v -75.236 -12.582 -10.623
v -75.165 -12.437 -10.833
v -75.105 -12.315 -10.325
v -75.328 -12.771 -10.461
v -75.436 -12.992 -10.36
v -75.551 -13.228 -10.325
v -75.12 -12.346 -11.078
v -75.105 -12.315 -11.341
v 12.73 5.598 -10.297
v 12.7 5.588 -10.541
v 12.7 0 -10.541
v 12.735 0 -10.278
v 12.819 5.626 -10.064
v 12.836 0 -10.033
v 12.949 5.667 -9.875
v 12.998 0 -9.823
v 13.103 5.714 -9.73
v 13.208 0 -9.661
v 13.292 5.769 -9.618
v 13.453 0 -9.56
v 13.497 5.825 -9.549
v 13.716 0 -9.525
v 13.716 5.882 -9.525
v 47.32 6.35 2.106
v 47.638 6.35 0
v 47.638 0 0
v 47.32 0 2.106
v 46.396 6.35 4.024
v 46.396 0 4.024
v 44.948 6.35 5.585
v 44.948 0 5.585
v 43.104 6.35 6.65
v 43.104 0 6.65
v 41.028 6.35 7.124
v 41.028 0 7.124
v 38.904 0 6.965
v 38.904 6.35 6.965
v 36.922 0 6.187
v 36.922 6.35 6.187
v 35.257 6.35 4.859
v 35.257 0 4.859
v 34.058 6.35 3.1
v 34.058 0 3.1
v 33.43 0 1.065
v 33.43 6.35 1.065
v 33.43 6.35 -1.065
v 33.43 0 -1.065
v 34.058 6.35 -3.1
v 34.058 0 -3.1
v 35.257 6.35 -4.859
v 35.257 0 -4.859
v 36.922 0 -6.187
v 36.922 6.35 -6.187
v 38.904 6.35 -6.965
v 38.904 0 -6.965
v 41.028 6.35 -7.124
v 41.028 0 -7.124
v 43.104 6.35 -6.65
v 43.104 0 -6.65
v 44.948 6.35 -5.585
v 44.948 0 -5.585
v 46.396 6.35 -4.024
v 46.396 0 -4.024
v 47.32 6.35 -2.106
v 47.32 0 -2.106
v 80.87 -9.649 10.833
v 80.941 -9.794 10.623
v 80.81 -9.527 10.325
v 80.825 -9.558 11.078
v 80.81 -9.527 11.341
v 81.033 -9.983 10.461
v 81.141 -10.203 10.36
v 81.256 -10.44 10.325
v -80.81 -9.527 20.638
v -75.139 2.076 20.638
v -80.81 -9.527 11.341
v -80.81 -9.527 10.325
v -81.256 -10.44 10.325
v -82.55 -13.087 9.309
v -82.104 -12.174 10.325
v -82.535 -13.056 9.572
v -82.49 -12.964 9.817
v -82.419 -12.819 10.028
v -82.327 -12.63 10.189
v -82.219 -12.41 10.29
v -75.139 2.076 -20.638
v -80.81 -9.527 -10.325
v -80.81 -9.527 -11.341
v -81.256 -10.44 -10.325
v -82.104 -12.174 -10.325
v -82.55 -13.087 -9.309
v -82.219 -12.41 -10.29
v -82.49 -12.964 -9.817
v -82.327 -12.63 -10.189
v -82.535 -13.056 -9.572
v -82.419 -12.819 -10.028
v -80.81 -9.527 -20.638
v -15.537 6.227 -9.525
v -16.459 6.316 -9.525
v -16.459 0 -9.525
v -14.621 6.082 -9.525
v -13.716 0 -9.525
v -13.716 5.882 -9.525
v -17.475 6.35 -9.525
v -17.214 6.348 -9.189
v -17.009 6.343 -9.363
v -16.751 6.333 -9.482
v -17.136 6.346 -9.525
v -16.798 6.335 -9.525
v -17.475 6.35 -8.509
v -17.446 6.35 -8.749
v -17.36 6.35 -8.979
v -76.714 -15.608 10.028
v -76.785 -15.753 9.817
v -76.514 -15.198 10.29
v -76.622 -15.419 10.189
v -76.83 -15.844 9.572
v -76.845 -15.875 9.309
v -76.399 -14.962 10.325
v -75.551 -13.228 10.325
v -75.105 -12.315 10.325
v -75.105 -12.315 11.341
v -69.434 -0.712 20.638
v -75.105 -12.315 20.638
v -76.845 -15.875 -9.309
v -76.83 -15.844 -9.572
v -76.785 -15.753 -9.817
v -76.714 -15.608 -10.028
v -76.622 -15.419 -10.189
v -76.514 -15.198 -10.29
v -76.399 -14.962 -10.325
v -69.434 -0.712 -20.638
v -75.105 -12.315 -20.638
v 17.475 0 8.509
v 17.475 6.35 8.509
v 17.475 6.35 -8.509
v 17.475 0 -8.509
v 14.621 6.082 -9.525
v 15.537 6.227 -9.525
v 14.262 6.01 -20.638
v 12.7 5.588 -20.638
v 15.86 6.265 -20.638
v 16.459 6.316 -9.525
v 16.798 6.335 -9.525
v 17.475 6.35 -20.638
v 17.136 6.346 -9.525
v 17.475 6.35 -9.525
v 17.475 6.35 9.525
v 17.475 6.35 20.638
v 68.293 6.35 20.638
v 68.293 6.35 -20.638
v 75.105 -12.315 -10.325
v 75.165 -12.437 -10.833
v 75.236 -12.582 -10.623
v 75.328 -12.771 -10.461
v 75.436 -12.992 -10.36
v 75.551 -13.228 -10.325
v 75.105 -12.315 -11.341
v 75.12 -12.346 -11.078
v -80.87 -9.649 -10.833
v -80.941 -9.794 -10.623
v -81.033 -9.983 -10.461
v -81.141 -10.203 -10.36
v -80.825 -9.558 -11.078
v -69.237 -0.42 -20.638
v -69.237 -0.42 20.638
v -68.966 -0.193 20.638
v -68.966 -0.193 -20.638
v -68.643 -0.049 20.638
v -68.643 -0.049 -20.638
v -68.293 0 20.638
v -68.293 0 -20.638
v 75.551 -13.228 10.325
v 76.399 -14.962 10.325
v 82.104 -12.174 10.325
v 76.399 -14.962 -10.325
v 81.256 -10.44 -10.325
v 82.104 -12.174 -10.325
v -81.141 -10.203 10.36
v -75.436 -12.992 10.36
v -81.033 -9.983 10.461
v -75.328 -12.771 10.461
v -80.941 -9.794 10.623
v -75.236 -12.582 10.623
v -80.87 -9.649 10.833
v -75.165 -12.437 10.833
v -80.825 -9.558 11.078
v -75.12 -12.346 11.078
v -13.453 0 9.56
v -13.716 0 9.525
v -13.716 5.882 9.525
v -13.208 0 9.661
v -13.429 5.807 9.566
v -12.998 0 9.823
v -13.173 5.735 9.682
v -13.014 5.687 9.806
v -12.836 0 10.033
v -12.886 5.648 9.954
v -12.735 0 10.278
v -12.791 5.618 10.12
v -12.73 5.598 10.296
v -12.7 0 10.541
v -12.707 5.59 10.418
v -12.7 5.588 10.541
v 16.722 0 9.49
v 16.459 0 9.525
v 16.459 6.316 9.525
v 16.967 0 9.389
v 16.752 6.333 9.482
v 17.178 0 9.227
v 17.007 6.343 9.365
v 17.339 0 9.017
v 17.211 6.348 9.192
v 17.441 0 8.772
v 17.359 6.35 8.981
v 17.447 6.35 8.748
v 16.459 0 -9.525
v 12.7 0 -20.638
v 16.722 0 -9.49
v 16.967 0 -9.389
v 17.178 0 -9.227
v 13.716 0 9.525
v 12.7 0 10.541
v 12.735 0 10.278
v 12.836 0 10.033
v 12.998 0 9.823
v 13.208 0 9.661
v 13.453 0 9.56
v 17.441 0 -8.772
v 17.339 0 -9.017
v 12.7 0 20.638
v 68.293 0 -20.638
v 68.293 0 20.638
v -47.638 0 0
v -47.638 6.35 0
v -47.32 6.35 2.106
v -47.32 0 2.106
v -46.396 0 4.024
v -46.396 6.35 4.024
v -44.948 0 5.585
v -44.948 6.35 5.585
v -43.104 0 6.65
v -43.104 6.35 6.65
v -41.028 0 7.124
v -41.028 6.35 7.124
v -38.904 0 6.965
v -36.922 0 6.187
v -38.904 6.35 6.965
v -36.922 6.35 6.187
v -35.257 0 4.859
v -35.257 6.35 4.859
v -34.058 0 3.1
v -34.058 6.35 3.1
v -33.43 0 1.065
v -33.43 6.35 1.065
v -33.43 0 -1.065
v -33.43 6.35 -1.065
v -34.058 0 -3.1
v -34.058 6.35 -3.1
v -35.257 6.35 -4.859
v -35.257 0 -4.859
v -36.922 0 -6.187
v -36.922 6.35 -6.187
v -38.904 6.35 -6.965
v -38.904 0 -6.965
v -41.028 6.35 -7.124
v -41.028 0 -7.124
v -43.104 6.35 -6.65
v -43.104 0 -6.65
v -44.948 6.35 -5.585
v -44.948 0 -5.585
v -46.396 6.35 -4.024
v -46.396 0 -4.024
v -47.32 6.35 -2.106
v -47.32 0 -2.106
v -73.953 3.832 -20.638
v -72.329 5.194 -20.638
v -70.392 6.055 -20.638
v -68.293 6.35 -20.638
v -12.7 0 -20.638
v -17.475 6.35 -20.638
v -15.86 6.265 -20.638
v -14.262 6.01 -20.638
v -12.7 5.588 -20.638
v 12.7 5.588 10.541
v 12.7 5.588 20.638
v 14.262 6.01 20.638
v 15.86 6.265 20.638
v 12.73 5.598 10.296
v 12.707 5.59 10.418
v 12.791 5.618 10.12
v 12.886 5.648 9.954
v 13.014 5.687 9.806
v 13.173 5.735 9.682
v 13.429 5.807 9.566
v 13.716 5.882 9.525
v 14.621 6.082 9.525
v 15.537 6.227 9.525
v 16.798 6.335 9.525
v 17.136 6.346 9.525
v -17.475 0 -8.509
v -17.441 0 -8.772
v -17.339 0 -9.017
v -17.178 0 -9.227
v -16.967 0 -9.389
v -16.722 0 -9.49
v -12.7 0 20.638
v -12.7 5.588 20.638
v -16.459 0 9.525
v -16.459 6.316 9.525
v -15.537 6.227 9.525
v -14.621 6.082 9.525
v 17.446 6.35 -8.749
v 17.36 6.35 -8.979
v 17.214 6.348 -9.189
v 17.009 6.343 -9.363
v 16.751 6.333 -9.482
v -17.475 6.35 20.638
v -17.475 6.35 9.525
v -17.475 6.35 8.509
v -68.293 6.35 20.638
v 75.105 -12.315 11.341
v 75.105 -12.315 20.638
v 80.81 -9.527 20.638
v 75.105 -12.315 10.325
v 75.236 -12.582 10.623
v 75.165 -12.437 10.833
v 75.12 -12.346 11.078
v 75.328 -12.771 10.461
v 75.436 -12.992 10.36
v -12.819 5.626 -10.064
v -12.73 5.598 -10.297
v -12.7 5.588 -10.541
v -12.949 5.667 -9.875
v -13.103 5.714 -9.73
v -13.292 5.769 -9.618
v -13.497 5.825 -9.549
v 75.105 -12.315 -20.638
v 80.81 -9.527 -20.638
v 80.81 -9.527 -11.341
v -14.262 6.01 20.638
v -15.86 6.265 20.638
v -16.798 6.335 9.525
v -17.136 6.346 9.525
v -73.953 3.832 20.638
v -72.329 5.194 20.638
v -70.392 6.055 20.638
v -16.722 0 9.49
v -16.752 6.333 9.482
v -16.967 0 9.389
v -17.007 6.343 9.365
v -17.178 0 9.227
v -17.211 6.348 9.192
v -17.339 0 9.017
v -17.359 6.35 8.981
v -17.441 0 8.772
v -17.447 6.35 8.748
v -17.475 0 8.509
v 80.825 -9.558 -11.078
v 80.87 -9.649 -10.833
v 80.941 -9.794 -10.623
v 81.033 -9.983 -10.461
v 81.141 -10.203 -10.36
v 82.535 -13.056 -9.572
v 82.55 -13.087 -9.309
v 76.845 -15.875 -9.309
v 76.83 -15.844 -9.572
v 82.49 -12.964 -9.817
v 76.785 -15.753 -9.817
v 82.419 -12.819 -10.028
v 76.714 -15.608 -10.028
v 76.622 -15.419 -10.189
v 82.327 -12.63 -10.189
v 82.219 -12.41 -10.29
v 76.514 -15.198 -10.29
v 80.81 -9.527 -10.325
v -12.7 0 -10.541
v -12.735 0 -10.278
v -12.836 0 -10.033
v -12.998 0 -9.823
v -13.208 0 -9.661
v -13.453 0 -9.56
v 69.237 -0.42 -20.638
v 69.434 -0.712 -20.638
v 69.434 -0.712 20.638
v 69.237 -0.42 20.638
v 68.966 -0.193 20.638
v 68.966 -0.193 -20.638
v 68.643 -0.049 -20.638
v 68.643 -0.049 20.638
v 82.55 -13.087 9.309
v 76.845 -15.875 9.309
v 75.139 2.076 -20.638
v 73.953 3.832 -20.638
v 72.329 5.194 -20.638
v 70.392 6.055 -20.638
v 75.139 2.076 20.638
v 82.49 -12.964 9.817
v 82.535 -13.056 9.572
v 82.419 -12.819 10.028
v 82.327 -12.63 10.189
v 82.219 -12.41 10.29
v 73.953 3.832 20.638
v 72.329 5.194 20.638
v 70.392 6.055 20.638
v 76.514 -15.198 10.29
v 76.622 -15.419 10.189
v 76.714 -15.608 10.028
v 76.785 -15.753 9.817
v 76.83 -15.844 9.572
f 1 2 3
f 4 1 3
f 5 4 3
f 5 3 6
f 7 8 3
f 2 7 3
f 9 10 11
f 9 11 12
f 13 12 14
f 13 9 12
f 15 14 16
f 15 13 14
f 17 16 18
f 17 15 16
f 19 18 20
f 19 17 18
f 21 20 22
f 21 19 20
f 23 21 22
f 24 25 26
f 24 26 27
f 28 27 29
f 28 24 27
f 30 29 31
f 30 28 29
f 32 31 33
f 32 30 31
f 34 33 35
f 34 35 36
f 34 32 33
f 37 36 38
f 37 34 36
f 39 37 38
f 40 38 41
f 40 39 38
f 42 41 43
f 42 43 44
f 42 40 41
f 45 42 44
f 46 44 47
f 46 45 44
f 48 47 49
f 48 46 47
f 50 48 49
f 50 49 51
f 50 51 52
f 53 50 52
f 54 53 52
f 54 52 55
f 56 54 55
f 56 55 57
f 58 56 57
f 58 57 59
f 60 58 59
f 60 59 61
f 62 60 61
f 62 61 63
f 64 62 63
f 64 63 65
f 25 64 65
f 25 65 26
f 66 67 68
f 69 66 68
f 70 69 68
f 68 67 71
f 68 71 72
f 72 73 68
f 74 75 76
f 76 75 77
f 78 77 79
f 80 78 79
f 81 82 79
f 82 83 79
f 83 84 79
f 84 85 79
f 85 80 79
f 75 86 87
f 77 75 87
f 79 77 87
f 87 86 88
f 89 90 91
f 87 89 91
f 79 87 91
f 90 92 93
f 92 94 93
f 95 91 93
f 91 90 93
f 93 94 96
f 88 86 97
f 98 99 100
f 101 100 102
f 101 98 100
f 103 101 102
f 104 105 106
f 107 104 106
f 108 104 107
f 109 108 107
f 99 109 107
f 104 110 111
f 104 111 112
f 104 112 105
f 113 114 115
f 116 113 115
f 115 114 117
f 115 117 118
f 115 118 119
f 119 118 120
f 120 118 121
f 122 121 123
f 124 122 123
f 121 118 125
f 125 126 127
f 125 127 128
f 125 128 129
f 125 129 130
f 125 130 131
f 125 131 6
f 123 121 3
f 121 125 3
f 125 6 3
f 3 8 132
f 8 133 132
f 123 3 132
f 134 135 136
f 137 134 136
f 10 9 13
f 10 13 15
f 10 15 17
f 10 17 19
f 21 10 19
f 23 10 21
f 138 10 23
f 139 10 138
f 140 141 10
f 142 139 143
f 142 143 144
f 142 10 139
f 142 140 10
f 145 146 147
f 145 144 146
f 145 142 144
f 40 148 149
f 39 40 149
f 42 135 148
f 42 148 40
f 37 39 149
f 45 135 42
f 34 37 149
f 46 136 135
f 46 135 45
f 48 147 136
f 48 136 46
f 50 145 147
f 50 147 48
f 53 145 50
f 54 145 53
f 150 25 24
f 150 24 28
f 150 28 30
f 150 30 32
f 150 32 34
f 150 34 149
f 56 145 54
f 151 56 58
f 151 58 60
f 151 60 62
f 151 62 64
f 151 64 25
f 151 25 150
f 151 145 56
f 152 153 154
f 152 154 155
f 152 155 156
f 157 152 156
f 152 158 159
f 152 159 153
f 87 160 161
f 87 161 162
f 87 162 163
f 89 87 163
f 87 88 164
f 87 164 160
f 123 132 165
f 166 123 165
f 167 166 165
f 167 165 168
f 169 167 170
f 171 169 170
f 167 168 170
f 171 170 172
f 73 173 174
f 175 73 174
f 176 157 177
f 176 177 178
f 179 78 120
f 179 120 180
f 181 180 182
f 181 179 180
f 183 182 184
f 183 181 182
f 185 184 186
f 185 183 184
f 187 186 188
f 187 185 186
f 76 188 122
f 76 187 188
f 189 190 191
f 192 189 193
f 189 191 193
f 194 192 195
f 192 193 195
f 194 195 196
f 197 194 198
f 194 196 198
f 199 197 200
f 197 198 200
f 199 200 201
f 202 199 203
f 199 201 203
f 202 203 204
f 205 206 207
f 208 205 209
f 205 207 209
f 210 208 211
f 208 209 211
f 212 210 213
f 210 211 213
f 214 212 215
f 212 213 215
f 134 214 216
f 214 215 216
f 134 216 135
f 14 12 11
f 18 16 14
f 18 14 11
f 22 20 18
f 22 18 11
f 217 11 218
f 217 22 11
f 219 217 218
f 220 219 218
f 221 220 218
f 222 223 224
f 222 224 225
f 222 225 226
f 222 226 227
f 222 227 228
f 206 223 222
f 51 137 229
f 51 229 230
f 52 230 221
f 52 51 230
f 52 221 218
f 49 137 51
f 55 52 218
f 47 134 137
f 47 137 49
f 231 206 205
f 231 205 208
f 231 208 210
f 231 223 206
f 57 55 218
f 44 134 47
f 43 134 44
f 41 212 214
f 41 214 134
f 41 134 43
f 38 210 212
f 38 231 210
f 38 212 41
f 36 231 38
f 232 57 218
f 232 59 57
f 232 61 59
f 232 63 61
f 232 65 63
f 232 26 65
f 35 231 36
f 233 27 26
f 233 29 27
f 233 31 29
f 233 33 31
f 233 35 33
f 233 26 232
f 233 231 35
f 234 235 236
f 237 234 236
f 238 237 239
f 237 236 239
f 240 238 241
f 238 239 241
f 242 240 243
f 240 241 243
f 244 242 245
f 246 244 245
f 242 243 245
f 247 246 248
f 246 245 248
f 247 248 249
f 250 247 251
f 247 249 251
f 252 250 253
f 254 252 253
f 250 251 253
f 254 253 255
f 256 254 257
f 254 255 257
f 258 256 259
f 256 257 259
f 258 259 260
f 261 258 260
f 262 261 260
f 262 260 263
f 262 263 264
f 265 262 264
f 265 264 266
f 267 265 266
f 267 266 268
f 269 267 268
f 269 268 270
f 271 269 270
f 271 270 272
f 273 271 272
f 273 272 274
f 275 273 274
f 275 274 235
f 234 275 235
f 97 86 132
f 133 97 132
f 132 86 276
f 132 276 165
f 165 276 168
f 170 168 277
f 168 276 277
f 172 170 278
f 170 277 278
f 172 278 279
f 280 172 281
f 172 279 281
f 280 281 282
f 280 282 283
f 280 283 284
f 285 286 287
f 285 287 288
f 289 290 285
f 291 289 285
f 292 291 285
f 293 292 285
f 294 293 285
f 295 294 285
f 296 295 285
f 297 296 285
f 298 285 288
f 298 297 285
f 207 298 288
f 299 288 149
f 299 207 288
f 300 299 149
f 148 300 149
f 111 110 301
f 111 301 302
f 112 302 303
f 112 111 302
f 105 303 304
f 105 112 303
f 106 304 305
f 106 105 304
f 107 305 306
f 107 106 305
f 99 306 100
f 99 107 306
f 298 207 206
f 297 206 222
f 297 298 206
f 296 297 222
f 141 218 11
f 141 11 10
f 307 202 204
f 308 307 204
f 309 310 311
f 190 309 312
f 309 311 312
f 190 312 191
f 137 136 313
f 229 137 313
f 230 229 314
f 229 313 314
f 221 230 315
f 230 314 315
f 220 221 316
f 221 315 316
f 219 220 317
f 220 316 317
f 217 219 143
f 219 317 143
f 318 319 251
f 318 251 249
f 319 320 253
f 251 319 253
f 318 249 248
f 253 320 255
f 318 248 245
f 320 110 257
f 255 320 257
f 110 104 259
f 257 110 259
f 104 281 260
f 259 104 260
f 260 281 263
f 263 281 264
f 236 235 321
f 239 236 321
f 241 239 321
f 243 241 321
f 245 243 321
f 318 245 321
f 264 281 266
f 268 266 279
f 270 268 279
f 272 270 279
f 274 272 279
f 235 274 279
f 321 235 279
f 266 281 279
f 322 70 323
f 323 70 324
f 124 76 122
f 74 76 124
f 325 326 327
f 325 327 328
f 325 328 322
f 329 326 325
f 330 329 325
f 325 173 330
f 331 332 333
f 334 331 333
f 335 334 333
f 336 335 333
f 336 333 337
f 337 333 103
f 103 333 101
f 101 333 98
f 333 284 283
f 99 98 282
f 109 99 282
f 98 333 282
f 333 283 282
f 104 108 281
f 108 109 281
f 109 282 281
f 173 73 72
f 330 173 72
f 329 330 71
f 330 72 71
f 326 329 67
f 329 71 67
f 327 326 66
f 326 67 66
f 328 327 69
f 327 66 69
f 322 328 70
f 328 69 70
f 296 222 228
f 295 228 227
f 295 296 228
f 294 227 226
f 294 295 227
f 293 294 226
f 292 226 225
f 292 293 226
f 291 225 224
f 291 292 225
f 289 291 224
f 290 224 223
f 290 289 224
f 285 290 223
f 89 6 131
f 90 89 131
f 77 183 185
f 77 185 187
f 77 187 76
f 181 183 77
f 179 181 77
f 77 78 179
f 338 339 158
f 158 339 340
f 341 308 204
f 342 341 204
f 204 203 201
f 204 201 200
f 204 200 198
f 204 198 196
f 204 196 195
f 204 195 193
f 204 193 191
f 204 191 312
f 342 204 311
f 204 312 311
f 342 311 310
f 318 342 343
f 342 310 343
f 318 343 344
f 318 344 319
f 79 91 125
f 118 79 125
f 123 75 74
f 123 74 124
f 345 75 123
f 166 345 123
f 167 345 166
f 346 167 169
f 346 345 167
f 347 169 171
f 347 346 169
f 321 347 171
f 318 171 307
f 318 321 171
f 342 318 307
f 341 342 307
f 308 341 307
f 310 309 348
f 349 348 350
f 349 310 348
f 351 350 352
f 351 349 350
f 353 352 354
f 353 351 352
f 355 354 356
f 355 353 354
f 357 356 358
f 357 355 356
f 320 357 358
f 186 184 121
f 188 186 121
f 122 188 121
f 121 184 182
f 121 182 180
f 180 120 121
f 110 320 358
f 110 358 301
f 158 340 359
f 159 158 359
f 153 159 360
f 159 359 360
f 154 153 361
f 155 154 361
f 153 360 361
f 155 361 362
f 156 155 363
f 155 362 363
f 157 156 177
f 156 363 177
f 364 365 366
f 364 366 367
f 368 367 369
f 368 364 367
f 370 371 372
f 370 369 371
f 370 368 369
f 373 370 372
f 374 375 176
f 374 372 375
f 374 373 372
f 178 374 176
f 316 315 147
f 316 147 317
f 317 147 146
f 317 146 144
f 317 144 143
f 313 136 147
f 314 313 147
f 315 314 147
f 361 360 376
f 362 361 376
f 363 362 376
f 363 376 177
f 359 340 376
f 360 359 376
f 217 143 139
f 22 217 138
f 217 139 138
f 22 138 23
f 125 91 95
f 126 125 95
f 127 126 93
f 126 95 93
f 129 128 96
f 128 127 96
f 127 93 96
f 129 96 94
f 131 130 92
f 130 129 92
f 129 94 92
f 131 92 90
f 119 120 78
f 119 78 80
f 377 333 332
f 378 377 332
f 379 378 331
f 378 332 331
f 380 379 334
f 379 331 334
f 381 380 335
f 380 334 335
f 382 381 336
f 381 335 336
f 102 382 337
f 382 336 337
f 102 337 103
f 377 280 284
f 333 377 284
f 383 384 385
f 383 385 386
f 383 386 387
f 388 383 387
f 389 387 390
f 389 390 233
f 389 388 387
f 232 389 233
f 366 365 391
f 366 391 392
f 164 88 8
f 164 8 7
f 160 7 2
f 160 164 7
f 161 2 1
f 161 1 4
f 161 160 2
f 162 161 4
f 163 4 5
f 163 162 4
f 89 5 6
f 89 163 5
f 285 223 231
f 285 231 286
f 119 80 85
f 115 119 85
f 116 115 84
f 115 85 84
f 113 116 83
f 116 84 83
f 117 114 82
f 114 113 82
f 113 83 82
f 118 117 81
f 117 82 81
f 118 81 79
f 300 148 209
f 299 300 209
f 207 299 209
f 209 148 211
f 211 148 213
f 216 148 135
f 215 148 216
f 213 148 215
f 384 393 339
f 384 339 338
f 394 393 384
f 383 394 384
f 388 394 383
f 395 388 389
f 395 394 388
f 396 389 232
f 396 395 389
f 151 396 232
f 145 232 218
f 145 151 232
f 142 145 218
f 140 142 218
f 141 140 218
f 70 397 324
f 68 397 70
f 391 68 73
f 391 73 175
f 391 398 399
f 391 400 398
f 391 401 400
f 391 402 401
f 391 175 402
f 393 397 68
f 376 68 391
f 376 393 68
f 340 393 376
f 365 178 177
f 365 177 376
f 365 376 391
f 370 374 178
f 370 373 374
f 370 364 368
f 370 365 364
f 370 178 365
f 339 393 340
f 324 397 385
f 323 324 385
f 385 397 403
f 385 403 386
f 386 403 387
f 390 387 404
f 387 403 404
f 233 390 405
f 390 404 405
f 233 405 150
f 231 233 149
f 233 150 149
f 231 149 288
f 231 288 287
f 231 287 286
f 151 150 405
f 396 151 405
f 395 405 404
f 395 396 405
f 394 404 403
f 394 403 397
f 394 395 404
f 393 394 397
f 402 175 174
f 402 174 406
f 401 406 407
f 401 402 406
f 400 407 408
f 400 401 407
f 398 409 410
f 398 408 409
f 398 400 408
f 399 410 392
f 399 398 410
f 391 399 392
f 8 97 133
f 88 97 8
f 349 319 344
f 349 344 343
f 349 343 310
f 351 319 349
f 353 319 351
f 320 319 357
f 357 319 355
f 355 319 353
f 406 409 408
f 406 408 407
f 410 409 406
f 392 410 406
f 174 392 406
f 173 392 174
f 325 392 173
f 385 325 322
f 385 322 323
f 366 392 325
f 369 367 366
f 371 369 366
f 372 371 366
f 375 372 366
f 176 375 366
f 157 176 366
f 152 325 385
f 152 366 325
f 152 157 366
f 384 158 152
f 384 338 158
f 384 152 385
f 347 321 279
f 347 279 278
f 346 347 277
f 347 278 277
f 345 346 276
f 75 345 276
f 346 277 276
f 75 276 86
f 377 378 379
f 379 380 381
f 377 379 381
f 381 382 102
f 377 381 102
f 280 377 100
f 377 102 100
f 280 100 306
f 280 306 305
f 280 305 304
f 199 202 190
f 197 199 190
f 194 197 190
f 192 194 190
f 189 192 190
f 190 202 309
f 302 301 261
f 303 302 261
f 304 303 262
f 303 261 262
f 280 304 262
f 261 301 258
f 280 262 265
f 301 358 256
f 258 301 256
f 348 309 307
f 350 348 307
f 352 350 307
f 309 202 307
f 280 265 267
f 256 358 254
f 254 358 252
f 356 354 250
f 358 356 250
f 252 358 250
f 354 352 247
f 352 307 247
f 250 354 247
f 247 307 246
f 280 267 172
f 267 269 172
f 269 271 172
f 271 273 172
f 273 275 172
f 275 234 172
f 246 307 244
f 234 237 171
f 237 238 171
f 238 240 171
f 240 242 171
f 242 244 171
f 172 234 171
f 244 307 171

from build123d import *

# Parameters (mm, degrees)
BOSS_EXTRUDE1_DEPTH      = 20.6375
BOSS_EXTRUDE1_DEPTH_BACK = 20.6375
SKETCH6_R                = 7.14375
SKETCH6_W                = 4.7752
SKETCH6_H                = 19.05
CUT_EXTRUDE1_DEPTH       = 88.945207551
SKETCH7_W                = 10.3124
SKETCH7_H                = 3.9624
CUT_EXTRUDE_3_DEPTH      = 767.15686601
FILLET1_R                = 1.016


with BuildPart() as part:
    # Sketch5 → Boss-Extrude1 (new, two sides: drawn at the far end of the back side and taken through both)
    with BuildSketch(Plane.XY.offset(-BOSS_EXTRUDE1_DEPTH_BACK)):
        with BuildLine():
            Line((-17.4752, 6.35), (-68.293230581, 6.35))
            ThreePointArc((-68.293230581, 6.35), (-72.328570401, 5.193778503), (-75.139304801, 2.075992792))
            Line((-75.139304801, 2.075992792), (-82.55, -13.086672673))
            Line((-82.55, -13.086672673), (-76.844938149, -15.875))
            Line((-76.844938149, -15.875), (-69.434242951, -0.712334535))
            ThreePointArc((-69.434242951, -0.712334535), (-68.965787217, -0.192703583), (-68.293230581, 0))
            Line((-68.293230581, 0), (-12.7, 0))
            Line((-12.7, 0), (-12.7, 5.588))
            ThreePointArc((-12.7, 5.588), (-15.057392158, 6.158302475), (-17.4752, 6.35))
        make_face()
    extrude(amount=BOSS_EXTRUDE1_DEPTH + BOSS_EXTRUDE1_DEPTH_BACK)

    # Sketch6 → Cut-Extrude1 (cut, through all)
    with BuildSketch(Plane(origin=(0, 6.35, 0), x_dir=(1, 0, 0), z_dir=(0, 1, 0))):
        with Locations(Location((-40.49395, 0, 0), (0, 0, 180))):
            Circle(SKETCH6_R)
        with Locations((-15.0876, 0)):
            Rectangle(SKETCH6_W, SKETCH6_H)
    extrude(amount=-CUT_EXTRUDE1_DEPTH, mode=Mode.SUBTRACT)

    # Sketch7 → Cut-Extrude 3 (cut, through all)
    with BuildSketch(Plane(origin=(-396.872635609, -656.207033754, 0), x_dir=(0, 0, 1), z_dir=(0.8984349370992722, -0.4391066656285541, 0))):
        with Locations((15.4813, -717.804165609)):
            Rectangle(SKETCH7_W, SKETCH7_H)
        with Locations((-15.4813, -717.804165609)):
            Rectangle(SKETCH7_W, SKETCH7_H)
    extrude(amount=CUT_EXTRUDE_3_DEPTH, mode=Mode.SUBTRACT)

    # Fillet1
    # the kernel refuses this fillet: 1.016 mm, written as the material it adds along each edge
    with BuildSketch(Plane(origin=(-17.4752, 8.89, -9.525), x_dir=(0, 0, 1), z_dir=(0, -1, 0))) as fillet1_piece_1_section:
        with BuildLine():
            CenterArc((FILLET1_R, -FILLET1_R), FILLET1_R, 90, 90)
            Line((0, -FILLET1_R), (0, 0))
            Line((0, 0), (FILLET1_R, 0))
        make_face()
    fillet1_piece_1 = extrude(amount=8.89, mode=Mode.PRIVATE)
    fillet1_piece_1 = fillet1_piece_1 & Plane(origin=(-17.4752, -8.993293333, -9.297995712), x_dir=(0.31122392671890353, 0.9503366074384731, 0), z_dir=(0, 0, -1)) * Cylinder(15.343293333, 22, mode=Mode.PRIVATE)
    add(fillet1_piece_1)
    with BuildSketch(Plane(origin=(-17.4752, 8.89, 9.525), x_dir=(1, 0, 0), z_dir=(0, -1, 0))) as fillet1_piece_2_section:
        with BuildLine():
            CenterArc((FILLET1_R, -FILLET1_R), FILLET1_R, 90, 90)
            Line((0, -FILLET1_R), (0, 0))
            Line((0, 0), (FILLET1_R, 0))
        make_face()
    fillet1_piece_2 = extrude(amount=8.89, mode=Mode.PRIVATE)
    fillet1_piece_2 = fillet1_piece_2 & Plane(origin=(-17.4752, -8.993293333, 9.29799564), x_dir=(0.31122392671890353, 0.9503366074384731, 0), z_dir=(0, 0, -1)) * Cylinder(15.343293333, 22, mode=Mode.PRIVATE)
    add(fillet1_piece_2)
    with BuildSketch(Plane(origin=(-80.810083748, -9.526714078, 10.3251), x_dir=(0, 0, 1), z_dir=(0.8984349370992722, -0.4391066656285541, 0))) as fillet1_piece_3:
        with BuildLine():
            CenterArc((FILLET1_R, FILLET1_R), FILLET1_R, 180, 90)
            Line((0, FILLET1_R), (0, 0))
            Line((0, 0), (FILLET1_R, 0))
        make_face()
    extrude(amount=6.35)
    with BuildSketch(Plane(origin=(-80.810083748, -9.526714078, -10.3251), x_dir=(0, 0, -1), z_dir=(0.8984349370992722, -0.4391066656285541, 0))) as fillet1_piece_4:
        with BuildLine():
            CenterArc((FILLET1_R, -FILLET1_R), FILLET1_R, 90, 90)
            Line((0, -FILLET1_R), (0, 0))
            Line((0, 0), (FILLET1_R, 0))
        make_face()
    extrude(amount=6.35)
    # the kernel refuses this fillet: 1.016 mm, written as the material it takes off along each edge
    with BuildSketch(Plane(origin=(-12.7, 8.128, -9.525), x_dir=(0, 0, -1), z_dir=(0, -1, 0)), Plane(origin=(-12.7, 8.128, 9.525), x_dir=(-1, 0, 0), z_dir=(0, -1, 0))) as fillet1_2_piece_1:
        with BuildLine():
            CenterArc((FILLET1_R, -FILLET1_R), FILLET1_R, 90, 90)
            Line((0, -FILLET1_R), (0, 0))
            Line((0, 0), (FILLET1_R, 0))
        make_face()
    extrude(amount=10.668, mode=Mode.SUBTRACT)
    with BuildSketch(Plane(origin=(-84.83202474, -11.971341743, 10.3251), x_dir=(0, 0, -1), z_dir=(0.8984349370992722, -0.4391066656285541, 0)), Plane(origin=(-84.83202474, -11.971341743, -10.3251), x_dir=(0.43910666562855405, 0.8984349370992722, 0), z_dir=(0.8984349370992722, -0.4391066656285541, 0))) as fillet1_2_piece_2:
        with BuildLine():
            CenterArc((FILLET1_R, FILLET1_R), FILLET1_R, 180, 90)
            Line((0, FILLET1_R), (0, 0))
            Line((0, 0), (FILLET1_R, 0))
        make_face()
    extrude(amount=11.43, mode=Mode.SUBTRACT)


with BuildPart() as body_2:
    # Mirror4: mirrored copy
    add(part.part.mirror(Plane(origin=(0, 0, 0), x_dir=(0, 0, 1), z_dir=(1, 0, 0))))


solid = Compound([part.part, body_2.part])
